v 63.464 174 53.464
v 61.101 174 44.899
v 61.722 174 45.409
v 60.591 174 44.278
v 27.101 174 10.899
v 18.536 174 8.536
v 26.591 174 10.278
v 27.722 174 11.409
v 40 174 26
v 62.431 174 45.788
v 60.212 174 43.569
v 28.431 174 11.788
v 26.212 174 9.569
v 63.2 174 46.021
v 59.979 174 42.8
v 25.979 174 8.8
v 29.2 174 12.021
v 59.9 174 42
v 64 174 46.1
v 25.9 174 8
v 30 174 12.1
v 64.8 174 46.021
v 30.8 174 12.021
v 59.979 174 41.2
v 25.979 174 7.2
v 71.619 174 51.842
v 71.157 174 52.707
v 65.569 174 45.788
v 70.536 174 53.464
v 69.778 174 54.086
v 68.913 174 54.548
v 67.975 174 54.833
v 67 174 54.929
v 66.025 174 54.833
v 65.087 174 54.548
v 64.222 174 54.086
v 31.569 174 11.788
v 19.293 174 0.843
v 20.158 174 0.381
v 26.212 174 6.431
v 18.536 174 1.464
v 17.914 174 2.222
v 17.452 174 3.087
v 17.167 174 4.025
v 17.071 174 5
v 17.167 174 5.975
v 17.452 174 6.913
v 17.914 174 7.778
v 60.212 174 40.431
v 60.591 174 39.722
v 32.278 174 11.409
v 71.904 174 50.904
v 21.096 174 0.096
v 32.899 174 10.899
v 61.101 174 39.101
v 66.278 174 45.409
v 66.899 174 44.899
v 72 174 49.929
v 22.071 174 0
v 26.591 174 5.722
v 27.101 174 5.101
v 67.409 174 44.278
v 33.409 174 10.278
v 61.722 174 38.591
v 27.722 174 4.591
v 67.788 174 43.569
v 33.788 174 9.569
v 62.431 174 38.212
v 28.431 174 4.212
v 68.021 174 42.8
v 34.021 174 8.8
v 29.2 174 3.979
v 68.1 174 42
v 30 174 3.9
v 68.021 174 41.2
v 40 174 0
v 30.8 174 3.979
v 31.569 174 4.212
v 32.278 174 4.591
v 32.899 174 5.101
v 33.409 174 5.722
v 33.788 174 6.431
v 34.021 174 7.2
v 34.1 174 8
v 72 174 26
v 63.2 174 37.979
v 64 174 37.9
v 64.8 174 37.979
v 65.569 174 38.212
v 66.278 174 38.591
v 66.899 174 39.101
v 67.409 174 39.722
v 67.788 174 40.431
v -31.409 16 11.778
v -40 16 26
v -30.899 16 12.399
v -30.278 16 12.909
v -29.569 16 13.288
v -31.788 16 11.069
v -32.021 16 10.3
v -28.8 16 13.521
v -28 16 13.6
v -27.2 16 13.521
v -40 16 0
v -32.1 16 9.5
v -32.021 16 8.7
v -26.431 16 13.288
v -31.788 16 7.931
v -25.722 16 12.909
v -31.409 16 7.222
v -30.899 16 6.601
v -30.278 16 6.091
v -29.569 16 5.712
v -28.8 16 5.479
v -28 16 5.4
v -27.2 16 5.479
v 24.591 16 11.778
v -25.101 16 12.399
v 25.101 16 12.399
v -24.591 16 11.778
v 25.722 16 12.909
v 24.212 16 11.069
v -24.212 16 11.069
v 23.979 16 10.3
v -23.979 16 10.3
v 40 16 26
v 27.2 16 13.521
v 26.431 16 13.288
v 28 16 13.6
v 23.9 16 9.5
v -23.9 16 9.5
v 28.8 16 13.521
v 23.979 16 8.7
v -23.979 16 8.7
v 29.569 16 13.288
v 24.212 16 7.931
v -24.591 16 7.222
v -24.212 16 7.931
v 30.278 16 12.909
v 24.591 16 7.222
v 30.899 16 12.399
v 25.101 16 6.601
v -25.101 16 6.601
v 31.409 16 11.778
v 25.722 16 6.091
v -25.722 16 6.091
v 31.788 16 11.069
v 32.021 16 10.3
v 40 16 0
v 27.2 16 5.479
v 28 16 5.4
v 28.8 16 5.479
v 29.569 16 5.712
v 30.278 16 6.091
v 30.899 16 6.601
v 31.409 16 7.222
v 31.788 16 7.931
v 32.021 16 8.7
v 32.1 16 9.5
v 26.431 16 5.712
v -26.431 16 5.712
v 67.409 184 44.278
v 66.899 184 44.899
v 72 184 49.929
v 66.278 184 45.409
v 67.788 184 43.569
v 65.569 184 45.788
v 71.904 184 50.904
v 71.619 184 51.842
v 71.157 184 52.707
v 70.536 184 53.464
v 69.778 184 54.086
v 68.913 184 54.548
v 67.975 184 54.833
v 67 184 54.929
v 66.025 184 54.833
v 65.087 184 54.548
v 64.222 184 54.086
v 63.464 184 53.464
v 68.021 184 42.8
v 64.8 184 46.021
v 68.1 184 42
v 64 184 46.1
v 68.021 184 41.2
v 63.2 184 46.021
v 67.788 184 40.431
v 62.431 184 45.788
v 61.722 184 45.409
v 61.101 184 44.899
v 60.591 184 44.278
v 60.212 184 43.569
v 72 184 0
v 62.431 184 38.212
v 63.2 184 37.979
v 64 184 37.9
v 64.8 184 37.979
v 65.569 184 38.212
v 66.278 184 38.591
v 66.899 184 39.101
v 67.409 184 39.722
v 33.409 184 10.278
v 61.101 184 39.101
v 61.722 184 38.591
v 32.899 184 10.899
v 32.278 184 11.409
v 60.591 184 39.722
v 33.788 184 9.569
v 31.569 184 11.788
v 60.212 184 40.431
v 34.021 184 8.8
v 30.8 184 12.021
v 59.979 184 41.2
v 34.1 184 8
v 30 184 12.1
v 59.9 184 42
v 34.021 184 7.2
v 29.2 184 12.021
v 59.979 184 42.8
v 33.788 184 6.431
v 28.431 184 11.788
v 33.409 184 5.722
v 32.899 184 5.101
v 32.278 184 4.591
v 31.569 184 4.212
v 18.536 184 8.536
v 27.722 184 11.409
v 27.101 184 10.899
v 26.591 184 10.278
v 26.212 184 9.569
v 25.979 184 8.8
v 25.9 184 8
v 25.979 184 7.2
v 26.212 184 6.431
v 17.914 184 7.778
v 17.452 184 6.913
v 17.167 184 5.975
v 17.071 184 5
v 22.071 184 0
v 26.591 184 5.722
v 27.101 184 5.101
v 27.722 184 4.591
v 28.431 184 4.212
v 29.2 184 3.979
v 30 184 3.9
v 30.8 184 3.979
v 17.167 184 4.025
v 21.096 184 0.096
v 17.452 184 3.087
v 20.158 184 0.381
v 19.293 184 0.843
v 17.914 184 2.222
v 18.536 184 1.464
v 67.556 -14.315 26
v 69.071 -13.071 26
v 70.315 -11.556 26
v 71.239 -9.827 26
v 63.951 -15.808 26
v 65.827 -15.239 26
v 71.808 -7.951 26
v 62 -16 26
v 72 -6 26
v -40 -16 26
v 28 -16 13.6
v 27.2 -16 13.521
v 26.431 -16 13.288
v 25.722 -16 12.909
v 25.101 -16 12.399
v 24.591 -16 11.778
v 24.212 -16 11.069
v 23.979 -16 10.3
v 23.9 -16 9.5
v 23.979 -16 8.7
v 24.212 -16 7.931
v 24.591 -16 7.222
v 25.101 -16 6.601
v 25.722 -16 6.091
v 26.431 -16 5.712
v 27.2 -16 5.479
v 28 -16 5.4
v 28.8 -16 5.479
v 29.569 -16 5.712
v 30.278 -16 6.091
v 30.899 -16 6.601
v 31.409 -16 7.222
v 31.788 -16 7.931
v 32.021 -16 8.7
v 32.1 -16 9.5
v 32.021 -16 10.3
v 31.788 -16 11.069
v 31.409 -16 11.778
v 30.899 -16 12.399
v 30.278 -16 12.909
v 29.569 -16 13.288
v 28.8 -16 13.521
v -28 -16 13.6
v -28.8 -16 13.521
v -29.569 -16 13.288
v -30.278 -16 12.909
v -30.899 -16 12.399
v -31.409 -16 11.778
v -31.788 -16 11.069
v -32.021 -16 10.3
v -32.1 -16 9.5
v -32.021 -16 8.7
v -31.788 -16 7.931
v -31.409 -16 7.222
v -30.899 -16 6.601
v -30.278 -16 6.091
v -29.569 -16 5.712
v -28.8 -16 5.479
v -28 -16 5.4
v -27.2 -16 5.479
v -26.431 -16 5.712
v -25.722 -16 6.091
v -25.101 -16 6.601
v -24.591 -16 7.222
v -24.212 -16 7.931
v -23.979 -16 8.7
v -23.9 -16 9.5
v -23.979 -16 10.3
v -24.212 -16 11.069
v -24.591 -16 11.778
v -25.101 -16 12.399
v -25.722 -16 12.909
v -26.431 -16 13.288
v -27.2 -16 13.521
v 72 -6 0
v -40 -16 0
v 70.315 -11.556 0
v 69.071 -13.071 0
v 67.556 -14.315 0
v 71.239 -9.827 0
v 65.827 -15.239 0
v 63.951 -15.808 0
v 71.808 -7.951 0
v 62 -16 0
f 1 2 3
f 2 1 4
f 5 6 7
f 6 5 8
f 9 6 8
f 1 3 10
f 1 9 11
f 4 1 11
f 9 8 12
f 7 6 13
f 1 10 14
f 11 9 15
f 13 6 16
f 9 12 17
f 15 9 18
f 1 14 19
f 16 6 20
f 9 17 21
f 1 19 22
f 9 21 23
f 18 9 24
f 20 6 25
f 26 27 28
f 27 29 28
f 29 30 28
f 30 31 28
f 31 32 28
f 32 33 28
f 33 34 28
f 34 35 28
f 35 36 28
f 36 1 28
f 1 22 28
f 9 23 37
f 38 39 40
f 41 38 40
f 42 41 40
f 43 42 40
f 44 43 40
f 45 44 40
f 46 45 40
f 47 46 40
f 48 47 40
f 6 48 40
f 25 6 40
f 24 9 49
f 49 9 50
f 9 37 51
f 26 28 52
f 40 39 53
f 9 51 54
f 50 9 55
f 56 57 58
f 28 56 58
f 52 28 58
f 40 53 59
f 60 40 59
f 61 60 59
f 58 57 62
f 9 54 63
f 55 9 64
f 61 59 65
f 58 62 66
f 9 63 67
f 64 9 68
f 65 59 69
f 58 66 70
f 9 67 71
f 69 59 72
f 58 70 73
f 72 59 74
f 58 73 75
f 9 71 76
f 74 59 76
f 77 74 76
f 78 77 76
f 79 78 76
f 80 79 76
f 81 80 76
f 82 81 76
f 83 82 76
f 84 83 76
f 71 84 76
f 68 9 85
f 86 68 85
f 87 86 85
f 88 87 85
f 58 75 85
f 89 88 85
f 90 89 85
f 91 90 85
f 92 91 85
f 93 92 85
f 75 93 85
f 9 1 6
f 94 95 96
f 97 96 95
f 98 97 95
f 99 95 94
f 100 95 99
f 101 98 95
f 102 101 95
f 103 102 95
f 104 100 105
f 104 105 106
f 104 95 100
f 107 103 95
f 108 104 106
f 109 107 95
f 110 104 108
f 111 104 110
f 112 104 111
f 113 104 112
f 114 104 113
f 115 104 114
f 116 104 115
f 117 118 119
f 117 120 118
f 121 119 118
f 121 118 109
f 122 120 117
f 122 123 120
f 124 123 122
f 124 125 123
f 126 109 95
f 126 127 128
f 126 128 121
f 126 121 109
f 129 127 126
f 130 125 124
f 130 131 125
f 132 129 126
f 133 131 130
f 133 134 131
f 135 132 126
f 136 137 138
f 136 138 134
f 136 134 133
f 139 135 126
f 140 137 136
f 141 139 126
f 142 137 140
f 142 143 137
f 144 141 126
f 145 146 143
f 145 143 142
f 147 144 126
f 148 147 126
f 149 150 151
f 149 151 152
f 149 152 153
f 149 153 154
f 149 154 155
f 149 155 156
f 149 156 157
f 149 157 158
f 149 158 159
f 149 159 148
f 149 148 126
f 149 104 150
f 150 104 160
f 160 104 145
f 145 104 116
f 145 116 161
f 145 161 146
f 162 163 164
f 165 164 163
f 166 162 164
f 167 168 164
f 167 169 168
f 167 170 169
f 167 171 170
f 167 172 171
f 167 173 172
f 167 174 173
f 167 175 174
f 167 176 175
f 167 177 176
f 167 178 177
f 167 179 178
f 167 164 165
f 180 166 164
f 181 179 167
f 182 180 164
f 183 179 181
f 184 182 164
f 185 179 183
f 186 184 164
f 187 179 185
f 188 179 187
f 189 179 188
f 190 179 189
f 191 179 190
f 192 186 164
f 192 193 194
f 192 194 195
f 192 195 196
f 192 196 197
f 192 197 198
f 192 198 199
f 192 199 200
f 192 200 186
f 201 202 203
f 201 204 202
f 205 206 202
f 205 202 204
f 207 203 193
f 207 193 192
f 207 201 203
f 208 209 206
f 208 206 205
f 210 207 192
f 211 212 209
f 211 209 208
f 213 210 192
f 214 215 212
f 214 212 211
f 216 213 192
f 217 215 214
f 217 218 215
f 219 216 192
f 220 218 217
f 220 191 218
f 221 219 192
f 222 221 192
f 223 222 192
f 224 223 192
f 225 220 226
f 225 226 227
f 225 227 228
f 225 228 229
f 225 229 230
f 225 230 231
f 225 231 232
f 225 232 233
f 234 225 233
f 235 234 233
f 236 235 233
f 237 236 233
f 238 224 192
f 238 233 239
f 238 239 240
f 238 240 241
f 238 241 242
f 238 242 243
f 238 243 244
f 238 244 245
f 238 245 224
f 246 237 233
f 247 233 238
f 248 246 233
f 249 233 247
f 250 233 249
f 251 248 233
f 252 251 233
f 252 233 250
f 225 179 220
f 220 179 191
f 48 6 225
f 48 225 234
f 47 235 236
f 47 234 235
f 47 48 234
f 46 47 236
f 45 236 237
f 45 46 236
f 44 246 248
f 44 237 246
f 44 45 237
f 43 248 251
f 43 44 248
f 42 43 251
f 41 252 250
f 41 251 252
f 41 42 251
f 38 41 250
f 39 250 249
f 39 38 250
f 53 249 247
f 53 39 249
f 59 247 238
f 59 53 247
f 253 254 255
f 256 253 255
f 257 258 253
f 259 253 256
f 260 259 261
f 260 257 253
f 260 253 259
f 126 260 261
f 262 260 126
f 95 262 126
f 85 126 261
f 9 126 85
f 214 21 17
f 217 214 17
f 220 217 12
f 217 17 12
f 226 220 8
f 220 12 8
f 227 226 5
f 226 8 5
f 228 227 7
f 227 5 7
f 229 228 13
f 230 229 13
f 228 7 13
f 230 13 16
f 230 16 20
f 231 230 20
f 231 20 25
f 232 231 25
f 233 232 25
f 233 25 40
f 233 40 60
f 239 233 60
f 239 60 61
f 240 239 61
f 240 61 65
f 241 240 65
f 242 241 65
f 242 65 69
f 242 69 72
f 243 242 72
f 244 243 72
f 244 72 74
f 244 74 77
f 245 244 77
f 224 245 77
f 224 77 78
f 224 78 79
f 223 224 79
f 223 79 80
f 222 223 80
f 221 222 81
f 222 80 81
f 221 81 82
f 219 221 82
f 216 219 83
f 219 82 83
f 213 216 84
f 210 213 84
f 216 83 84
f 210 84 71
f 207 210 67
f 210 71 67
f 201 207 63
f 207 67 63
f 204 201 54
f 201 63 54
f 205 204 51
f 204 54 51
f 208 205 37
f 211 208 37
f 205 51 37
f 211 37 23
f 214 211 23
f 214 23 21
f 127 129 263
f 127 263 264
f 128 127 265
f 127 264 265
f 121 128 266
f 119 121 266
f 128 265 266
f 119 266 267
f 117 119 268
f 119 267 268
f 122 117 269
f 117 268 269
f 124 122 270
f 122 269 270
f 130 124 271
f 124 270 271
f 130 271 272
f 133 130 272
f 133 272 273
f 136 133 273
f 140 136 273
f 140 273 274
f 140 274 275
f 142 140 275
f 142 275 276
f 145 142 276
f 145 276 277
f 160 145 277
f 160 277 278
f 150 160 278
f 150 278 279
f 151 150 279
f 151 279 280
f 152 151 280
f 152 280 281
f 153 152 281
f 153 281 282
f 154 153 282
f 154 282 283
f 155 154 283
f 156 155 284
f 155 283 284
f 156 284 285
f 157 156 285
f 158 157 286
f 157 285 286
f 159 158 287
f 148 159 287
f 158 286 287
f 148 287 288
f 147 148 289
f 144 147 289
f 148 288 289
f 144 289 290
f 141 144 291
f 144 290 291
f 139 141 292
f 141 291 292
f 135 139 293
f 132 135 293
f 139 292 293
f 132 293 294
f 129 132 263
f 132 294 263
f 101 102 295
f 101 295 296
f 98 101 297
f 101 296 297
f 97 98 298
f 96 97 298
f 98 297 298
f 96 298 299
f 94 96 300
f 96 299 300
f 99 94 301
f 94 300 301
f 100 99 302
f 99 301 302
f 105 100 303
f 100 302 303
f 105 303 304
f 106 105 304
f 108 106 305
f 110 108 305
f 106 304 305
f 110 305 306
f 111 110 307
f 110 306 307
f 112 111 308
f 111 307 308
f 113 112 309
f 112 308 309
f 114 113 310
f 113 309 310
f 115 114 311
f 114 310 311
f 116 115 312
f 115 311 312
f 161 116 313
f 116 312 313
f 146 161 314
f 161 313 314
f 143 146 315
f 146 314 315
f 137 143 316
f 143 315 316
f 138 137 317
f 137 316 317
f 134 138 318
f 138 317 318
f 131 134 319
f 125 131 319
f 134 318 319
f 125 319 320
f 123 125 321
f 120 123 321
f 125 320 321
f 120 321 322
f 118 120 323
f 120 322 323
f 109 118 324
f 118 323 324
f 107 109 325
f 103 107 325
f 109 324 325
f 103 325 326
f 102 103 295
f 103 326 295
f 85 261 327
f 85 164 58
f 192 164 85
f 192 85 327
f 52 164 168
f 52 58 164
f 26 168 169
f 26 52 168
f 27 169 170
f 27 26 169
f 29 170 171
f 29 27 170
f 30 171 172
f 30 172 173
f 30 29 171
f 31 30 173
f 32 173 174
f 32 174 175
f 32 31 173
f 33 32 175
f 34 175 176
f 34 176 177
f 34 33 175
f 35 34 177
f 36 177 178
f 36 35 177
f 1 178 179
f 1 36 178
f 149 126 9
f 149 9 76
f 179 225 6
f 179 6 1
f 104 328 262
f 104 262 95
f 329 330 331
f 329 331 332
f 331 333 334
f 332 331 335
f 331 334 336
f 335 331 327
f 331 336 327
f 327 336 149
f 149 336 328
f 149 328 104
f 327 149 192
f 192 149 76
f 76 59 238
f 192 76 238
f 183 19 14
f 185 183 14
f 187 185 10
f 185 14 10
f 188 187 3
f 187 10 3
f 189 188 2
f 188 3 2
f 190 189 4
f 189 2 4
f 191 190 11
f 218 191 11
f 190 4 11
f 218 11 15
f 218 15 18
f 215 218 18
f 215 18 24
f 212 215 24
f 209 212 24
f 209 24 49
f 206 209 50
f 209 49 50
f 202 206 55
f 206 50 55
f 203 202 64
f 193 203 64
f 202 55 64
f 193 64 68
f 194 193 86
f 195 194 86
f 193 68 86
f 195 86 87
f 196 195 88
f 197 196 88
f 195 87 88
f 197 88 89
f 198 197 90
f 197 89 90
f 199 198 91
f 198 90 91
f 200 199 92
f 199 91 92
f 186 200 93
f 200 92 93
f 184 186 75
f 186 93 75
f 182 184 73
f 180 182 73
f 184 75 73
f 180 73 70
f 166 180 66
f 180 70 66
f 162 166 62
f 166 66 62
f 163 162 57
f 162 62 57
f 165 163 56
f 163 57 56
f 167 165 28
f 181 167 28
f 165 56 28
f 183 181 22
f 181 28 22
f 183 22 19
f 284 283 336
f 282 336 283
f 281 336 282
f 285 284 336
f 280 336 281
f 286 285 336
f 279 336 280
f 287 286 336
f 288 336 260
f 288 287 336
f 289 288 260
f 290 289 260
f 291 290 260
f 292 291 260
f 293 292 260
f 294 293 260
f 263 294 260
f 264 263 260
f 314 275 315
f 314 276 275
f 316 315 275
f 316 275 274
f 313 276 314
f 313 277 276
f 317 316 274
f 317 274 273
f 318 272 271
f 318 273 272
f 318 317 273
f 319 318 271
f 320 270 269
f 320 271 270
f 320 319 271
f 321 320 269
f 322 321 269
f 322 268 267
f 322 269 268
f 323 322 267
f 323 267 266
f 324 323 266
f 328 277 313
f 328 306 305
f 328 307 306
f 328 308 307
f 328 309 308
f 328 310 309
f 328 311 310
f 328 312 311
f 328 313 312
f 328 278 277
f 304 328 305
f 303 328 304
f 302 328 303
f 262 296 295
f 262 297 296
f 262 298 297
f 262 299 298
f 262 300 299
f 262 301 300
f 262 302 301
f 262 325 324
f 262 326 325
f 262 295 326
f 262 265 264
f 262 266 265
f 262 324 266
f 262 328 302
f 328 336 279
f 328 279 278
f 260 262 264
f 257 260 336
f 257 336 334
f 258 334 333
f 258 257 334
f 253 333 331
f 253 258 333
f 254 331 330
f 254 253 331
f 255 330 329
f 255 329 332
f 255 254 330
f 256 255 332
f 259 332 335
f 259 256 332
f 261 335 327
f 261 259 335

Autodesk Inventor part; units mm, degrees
ref_plane "YZ Plane" through (0, 0, 0) normal (1, 0, 0) x (0, 1, 0)
ref_plane "XZ Plane" through (0, 0, 0) normal (0, 1, 0) x (-1, 0, 0)
ref_plane "XY Plane" through (0, 0, 0) normal (0, 0, 1) x (1, 0, 0)
sketch "Sketch2" plane through (0, 0, 0) normal (0, 0, 1) x (1, 0, 0)
  line L0 (-40, 16) -> (40, 16)
  line L1 (40, 16) -> (40, -16)
  line L2 (40, -16) -> (-40, -16)
  line L3 (-40, -16) -> (-40, 16)
  line L4 (-40, 16) -> (40, -16) construction
  line L5 (40, 16) -> (-40, -16) construction
  point P0 (0, 0)
  dimension "d4" = 32
  dimension "d5" = 80
extrude "Extrusion1" add sketch "Sketch2" along normal blind 26
sketch "Sketch6" plane through (-40, 16, 0) normal (0, 1, 0) x (1, 0, 0)
  line L0 (12, -9.5) -> (0, -9.5) construction
  line L1 (0, 0) -> (0, -26) projected
  line L2 (68, -9.5) -> (80, -9.5) construction
  line L3 (80, 0) -> (80, -26) projected
  line L4 (80, 0) -> (0, 0) projected
  point P0 (40, 0)
  point P1 (74, -9.5)
  dimension "d29" = 56
  dimension "d30" = 9.5
hole "Hole3" at (-28, 16, 9.5) at (28, 16, 9.5) direction (0, -1, 0) diameter 8.2 end through all
sketch "Sketch9" plane through (-40, 16, 0) normal (0, 1, 0) x (1, 0, 0)
  line L0 (0, 0) -> (0, -26) projected
  line L1 (80, -26) -> (0, -26) projected
  line L2 (0, 0) -> (80, -26)
  point P0 (40, 0)
sketch "Sketch10" plane through (-40, 16, 0) normal (0, 1, 0) x (1, 0, 0)
  point P0 (40, 0)
sketch "Sketch11" plane through (40, -16, 0) normal (1, 0, 0) x (0, 0, -1)
  line L0 (0, 0) -> (0, 32) projected
  line L1 (0, 0) -> (-26, 0)
  line L2 (-26, 0) -> (-26, 200)
  line L3 (-26, 200) -> (0, 200)
  line L4 (0, 200) -> (0, 0)
  line L5 (-26, 0) -> (-26, 32) projected
  point P0 (0, 16)
  dimension "d52" = 200
extrude "Extrusion4" add sketch "Sketch11" along normal blind 32
fillet "Fillet1" radius 10 1 edges at (72, -16, 13)
sketch "Sketch13" plane through (40, 184, 26) normal (0, 1, 0) x (1, 0, 0)
  line L0 (32, 26) -> (-30, 26)
  line L1 (0, 26) -> (-80, 26) projected
  line L2 (32, 26) -> (32, 0) projected
  line L3 (32, 26) -> (32, -36)
  line L4 (-30, 26) -> (32, -36)
  point P0 (-40, 26)
  dimension "d58" = 62
extrude "Extrusion5" add sketch "Sketch13" against normal blind 10
fillet "Fillet2" radius 5 1 edges at (10, 179, 0)
fillet "Fillet3" radius 5 1 edges at (72, 179, 62)
sketch "Sketch15" plane through (22.0711, 184, 0) normal (0, 1, 0) x (1, 0, 0)
  line L0 (0, 0) -> (49.9289, 0) projected
  line L1 (49.9289, 0) -> (49.9289, -26) projected
  line L2 (49.9289, 0) -> (17.9289, 0)
  line L3 (17.9289, 0) -> (17.9289, -32)
  line L4 (17.9289, -32) -> (49.9289, -32)
  line L5 (49.9289, -32) -> (49.9289, 0)
  line L6 (49.9289, 0) -> (49.9289, -49.9289) projected
  point P0 (-22.0711, 0)
  point P1 (41.9289, -42)
  point P2 (7.9289, -8)
  dimension "d63" = 8
  dimension "d64" = 32
  dimension "d65" = 32
  dimension "d66" = 10
  dimension "d67" = 10
  dimension "d68" = 8
hole "Hole6" at (30, 184, 8) at (64, 184, 42) direction (0, -1, 0) diameter 8.2 depth 20
properties part number "13042026-12"
